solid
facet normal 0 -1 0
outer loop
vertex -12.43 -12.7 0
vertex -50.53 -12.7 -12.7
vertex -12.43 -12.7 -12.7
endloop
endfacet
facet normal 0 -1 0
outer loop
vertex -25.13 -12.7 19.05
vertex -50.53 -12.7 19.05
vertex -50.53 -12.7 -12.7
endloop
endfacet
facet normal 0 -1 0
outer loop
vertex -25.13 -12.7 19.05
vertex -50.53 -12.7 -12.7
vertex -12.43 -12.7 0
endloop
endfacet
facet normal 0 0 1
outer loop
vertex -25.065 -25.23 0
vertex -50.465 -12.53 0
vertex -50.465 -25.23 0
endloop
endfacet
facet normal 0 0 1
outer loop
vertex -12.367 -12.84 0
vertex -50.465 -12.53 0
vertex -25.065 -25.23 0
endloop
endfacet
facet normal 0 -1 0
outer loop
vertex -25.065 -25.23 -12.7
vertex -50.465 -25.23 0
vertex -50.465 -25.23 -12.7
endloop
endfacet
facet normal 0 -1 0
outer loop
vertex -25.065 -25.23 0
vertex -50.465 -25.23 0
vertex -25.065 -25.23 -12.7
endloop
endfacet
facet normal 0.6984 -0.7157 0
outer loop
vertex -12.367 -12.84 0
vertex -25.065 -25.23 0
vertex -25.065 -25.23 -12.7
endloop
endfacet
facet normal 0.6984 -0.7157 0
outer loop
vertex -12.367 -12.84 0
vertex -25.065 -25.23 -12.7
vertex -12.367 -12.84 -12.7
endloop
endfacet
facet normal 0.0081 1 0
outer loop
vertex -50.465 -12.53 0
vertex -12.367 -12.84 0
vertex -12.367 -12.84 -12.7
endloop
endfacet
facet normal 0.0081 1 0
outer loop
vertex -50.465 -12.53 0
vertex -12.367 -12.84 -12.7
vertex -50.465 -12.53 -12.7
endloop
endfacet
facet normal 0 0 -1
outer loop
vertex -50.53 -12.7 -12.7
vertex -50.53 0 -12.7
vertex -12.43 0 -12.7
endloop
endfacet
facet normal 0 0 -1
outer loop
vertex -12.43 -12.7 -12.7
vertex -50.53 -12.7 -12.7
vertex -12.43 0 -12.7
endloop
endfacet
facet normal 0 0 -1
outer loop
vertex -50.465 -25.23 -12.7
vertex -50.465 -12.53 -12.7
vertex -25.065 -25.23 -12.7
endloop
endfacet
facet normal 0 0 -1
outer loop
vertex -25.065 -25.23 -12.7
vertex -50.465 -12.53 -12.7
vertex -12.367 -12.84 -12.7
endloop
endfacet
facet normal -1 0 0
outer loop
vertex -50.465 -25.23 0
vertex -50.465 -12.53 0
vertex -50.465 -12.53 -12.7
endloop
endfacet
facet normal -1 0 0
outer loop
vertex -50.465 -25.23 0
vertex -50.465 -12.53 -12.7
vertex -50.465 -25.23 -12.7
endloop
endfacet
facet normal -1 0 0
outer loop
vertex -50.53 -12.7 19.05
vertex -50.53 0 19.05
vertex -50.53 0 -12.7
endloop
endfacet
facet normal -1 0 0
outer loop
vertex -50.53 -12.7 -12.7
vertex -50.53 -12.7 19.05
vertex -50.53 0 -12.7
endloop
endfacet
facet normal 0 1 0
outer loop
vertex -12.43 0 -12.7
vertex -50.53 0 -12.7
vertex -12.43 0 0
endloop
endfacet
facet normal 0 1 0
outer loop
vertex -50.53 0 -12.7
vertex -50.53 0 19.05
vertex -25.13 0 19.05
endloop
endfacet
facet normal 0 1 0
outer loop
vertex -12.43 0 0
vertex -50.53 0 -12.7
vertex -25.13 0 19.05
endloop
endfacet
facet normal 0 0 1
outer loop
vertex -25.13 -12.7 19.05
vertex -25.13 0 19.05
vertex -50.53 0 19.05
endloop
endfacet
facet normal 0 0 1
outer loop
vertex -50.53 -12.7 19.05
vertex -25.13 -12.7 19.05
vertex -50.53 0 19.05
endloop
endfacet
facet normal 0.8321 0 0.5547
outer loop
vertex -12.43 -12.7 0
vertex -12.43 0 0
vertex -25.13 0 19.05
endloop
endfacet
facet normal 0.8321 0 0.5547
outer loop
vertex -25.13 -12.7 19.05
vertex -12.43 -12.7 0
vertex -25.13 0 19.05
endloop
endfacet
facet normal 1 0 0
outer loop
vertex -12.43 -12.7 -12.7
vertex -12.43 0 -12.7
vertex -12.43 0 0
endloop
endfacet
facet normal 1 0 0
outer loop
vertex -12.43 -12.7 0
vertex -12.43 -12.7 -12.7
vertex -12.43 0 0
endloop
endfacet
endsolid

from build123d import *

# Parameters (mm, degrees)
F0_W     = 38.1
F0_H     = 12.7
F1_DEPTH = 12.7
F3_DEPTH = 12.7


with BuildPart() as f1:
    # F0 (on Front) → F1 (new body)
    with BuildSketch(Plane.XZ):
        Polygon((-50.529788, 0), (-12.429788, 0), (-25.129788, 19.05), (-50.529788, 19.05), align=None)
        with Locations((-31.479788, -6.35)):
            Rectangle(F0_W, F0_H)
    extrude(amount=F1_DEPTH)


with BuildPart() as f3:
    # F2 (on Top) → F3 (new body)
    with BuildSketch(Plane.XY):
        Polygon((-12.366549, -12.840229), (-50.46529, -12.530484), (-50.46529, -25.230484), (-25.06529, -25.230484), align=None)
    extrude(amount=-F3_DEPTH)


solid = Compound([f1.part, f3.part])
